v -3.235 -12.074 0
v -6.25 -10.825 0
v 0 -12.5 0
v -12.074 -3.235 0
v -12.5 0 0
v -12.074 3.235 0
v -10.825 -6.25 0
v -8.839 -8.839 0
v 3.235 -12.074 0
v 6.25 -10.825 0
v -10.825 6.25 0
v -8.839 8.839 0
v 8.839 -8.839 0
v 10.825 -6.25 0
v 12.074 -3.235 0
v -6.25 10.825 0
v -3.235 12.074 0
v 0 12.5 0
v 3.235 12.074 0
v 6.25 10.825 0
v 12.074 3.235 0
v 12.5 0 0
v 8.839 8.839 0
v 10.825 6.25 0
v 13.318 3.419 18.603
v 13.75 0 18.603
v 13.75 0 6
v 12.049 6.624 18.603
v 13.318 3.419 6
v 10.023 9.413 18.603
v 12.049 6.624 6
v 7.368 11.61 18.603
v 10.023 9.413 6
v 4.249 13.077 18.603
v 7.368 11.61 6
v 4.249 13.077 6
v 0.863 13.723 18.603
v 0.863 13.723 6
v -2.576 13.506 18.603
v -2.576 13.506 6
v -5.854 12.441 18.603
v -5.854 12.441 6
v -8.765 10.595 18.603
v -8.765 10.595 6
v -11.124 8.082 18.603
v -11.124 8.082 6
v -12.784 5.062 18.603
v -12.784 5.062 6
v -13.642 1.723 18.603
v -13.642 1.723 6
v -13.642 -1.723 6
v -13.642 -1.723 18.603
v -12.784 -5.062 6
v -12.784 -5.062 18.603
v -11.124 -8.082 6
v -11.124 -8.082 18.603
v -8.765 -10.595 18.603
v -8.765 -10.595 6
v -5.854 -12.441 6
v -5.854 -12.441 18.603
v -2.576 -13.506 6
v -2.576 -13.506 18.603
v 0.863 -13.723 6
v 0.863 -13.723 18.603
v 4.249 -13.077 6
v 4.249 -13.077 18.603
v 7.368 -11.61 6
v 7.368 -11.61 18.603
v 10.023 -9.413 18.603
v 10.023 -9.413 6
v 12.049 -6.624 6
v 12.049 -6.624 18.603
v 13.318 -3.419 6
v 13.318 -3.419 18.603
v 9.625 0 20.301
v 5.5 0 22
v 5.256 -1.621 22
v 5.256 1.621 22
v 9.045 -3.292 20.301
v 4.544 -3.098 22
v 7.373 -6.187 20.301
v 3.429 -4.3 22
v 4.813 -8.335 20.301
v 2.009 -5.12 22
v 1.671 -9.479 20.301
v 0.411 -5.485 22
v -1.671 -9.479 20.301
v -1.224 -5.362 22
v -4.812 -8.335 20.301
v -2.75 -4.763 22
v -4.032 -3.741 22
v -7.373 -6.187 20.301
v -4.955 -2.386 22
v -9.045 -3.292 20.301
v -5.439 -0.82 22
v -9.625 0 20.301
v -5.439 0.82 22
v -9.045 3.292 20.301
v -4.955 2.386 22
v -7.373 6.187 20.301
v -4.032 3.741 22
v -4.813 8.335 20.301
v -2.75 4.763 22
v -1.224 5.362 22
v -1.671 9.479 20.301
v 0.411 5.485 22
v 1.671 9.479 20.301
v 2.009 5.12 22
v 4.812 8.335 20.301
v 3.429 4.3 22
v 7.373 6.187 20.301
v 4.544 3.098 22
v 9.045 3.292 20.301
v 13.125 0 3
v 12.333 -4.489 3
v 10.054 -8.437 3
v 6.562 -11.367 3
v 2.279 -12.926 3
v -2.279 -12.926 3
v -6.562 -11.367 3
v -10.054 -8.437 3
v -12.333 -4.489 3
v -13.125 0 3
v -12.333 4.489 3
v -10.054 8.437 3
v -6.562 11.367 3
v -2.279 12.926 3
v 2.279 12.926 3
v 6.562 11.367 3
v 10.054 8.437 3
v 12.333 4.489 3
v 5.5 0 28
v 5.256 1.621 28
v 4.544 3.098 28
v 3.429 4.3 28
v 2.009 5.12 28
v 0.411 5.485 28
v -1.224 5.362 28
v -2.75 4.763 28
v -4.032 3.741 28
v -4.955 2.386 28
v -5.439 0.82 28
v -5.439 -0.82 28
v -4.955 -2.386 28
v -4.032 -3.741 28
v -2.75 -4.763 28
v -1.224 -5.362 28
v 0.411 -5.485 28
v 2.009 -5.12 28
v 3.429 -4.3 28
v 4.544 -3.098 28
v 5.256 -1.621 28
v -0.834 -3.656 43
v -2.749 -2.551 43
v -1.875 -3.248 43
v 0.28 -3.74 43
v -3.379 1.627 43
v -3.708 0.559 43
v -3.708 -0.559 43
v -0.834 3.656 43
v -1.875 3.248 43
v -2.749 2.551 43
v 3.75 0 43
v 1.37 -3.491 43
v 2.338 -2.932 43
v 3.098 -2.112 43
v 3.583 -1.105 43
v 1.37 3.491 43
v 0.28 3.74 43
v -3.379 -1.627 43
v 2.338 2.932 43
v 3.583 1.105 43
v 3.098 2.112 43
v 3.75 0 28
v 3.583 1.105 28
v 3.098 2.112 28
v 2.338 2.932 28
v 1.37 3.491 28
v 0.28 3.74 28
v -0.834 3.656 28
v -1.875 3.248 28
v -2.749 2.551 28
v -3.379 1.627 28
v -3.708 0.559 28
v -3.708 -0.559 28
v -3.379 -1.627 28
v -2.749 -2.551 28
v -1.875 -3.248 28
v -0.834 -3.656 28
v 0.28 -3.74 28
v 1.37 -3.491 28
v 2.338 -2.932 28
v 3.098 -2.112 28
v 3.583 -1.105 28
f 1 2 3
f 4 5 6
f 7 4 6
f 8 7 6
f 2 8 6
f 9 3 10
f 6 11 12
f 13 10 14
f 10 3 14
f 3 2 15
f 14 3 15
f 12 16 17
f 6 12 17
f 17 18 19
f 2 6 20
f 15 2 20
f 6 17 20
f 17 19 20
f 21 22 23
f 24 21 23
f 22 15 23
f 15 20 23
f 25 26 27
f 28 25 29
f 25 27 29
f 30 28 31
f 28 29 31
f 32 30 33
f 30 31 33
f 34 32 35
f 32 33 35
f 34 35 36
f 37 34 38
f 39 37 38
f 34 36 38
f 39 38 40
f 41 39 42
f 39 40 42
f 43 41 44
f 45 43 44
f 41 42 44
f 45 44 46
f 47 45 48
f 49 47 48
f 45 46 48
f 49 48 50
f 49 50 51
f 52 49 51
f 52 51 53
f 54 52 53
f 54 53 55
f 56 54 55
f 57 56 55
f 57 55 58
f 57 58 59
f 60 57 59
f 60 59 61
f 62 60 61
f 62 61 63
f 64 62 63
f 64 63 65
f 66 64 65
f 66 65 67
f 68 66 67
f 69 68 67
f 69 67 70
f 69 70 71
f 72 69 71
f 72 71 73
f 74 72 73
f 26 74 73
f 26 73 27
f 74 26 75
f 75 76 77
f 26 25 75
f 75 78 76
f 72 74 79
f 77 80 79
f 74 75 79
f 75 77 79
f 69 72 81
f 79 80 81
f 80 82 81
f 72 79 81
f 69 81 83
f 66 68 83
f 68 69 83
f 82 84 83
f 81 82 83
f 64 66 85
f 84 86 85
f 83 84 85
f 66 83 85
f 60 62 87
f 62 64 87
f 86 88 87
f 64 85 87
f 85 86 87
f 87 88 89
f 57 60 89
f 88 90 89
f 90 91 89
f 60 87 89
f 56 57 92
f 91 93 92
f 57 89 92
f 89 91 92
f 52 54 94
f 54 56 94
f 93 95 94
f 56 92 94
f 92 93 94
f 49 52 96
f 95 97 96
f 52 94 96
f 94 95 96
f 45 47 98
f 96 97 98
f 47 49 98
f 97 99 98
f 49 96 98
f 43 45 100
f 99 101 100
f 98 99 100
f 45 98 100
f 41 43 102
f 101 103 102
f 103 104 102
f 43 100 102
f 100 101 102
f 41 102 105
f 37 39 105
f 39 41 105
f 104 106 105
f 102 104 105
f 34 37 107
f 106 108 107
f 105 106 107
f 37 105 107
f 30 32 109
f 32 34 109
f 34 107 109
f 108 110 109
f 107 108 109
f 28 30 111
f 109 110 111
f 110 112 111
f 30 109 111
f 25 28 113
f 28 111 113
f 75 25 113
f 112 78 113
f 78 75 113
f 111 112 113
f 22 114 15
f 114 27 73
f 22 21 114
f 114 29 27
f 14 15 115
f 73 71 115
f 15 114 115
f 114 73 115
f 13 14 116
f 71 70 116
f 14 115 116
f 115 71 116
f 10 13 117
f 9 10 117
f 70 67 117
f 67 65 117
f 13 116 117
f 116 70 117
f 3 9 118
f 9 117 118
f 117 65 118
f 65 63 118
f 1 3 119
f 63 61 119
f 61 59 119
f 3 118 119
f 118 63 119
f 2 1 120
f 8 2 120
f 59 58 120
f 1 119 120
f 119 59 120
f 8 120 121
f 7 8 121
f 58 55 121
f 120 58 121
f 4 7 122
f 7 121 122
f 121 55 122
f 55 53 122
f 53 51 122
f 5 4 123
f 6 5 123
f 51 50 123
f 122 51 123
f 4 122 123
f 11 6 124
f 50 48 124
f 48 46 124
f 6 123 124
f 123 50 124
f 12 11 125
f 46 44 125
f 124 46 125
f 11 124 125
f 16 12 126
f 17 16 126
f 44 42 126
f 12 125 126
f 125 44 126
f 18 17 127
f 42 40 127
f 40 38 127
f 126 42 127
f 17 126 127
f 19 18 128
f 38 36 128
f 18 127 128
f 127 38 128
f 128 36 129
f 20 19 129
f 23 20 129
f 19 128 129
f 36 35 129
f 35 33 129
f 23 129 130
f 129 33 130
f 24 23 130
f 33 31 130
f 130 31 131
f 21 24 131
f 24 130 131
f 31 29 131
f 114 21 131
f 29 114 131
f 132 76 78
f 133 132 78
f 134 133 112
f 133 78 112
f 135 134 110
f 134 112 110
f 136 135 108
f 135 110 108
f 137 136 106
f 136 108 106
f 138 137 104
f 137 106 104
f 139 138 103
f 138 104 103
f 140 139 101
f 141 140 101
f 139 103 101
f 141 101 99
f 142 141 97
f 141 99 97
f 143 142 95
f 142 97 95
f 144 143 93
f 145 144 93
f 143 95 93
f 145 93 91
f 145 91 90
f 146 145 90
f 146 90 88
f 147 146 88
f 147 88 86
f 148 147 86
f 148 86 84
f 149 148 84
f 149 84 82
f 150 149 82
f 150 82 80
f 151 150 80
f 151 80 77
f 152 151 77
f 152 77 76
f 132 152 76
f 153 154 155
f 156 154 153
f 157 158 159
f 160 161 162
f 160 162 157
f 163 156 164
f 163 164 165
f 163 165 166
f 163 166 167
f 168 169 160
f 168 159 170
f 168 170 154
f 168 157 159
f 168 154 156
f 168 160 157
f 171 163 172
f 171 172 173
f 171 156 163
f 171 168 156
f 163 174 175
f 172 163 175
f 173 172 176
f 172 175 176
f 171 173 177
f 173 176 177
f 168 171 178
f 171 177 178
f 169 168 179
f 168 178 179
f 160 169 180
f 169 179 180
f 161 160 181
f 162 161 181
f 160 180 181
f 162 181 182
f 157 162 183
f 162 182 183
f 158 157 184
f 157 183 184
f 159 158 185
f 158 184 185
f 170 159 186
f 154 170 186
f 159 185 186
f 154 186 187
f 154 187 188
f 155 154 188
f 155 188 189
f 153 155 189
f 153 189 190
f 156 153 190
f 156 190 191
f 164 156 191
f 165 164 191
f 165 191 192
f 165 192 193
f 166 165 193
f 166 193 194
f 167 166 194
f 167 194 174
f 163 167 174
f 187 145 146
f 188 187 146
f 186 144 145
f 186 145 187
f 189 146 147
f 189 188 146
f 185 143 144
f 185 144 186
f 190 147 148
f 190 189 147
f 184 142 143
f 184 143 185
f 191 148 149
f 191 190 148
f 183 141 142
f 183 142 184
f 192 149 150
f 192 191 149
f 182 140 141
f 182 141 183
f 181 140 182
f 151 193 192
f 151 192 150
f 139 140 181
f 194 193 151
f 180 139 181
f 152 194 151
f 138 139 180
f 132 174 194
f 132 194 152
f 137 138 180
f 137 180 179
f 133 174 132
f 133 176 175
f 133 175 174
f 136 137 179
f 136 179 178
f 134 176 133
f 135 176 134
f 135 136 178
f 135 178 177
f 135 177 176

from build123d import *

# Parameters (mm, degrees)
F1_START    = 6
F0_R        = 13.75
F0_R_2      = 12.5
F0_R_3      = 5.5
F0_R_4      = 3.75
F1_DEPTH    = 12.5
F2_DEPTH    = 22
F3_DEPTH    = 28
F4_DEPTH    = 7
F5_SIZE2    = 1.24999
F5_SIZE     = 5.99999
F6_S5_R     = 13.75
F6_T6_DEPTH = 21
F7_DEPTH    = 43


# Not quite as in the source:
# - a fillet or chamfer that OpenCascade refuses, or shapes differently, is made with other operations: its cross-section is extruded or revolved along the edge and cut away or added
# - a fillet or chamfer is up to 0.001 mm smaller than in the source, because OpenCascade refuses the exact size


with BuildPart() as f1:
    # F0 (on Top) → F1 (new body)
    with BuildSketch(Plane.XY.offset(F1_START)):
        Circle(F0_R)
        Circle(F0_R_2, mode=Mode.SUBTRACT)
        Circle(F0_R_2)
        Circle(F0_R_3, mode=Mode.SUBTRACT)
        Circle(F0_R_3)
        Circle(F0_R_4, mode=Mode.SUBTRACT)
        Circle(F0_R_4)
    extrude(amount=F1_DEPTH)

    # F0 (on Top) → F2 (join)
    with BuildSketch(Plane.XY):
        Circle(F0_R_3)
        Circle(F0_R_4, mode=Mode.SUBTRACT)
        Circle(F0_R_4)
    extrude(amount=F2_DEPTH)

    # F0 (on Top) → F3 (join)
    with BuildSketch(Plane.XY):
        Circle(F0_R_3)
        Circle(F0_R_4, mode=Mode.SUBTRACT)
        Circle(F0_R_4)
    extrude(amount=F3_DEPTH)

    # F0 (on Top) → F4 (join)
    with BuildSketch(Plane.XY):
        Circle(F0_R_2)
        Circle(F0_R_3, mode=Mode.SUBTRACT)
    extrude(amount=F4_DEPTH)

    # F5 (size 6 and 1.25 in the source; OpenCascade refuses exactly that, so slightly less here)
    f5_edges = [f1.edges().sort_by_distance(p)[0] for p in [
        (-12.5, 0, 6),
    ]]
    f5_side = f1.faces().sort_by_distance((-12.5, 0, 3))[0]
    chamfer(f5_edges, length=F5_SIZE, length2=F5_SIZE2, reference=f5_side)

    # F6: chamfer of 8.5 x 3.5 on 1 edges, made by hand


with BuildPart() as f6_tool2:
    # F6_s3 → F6_t4 (revolve)
    with BuildSketch(Plane.XZ):
        Polygon((14, 18.5), (5.5, 22), (5.5, 18.5), align=None)
    revolve(axis=Axis((0, 0, 18.5), (0, 0, -1)))

    # F6_s5 → F6_t6 (intersect, symmetric)
    with BuildSketch(Plane.XY.offset(20.2)):
        Circle(F6_S5_R)
    extrude(amount=F6_T6_DEPTH, both=True, mode=Mode.INTERSECT)


with BuildPart() as f1_1:
    add(f1.part)

    # F6_t1: union F6_tool2
    add(f6_tool2.part)

    # F0 (on Top) → F7 (join)
    with BuildSketch(Plane.XY):
        Circle(F0_R_4)
    extrude(amount=F7_DEPTH)


solid = f1_1.part
